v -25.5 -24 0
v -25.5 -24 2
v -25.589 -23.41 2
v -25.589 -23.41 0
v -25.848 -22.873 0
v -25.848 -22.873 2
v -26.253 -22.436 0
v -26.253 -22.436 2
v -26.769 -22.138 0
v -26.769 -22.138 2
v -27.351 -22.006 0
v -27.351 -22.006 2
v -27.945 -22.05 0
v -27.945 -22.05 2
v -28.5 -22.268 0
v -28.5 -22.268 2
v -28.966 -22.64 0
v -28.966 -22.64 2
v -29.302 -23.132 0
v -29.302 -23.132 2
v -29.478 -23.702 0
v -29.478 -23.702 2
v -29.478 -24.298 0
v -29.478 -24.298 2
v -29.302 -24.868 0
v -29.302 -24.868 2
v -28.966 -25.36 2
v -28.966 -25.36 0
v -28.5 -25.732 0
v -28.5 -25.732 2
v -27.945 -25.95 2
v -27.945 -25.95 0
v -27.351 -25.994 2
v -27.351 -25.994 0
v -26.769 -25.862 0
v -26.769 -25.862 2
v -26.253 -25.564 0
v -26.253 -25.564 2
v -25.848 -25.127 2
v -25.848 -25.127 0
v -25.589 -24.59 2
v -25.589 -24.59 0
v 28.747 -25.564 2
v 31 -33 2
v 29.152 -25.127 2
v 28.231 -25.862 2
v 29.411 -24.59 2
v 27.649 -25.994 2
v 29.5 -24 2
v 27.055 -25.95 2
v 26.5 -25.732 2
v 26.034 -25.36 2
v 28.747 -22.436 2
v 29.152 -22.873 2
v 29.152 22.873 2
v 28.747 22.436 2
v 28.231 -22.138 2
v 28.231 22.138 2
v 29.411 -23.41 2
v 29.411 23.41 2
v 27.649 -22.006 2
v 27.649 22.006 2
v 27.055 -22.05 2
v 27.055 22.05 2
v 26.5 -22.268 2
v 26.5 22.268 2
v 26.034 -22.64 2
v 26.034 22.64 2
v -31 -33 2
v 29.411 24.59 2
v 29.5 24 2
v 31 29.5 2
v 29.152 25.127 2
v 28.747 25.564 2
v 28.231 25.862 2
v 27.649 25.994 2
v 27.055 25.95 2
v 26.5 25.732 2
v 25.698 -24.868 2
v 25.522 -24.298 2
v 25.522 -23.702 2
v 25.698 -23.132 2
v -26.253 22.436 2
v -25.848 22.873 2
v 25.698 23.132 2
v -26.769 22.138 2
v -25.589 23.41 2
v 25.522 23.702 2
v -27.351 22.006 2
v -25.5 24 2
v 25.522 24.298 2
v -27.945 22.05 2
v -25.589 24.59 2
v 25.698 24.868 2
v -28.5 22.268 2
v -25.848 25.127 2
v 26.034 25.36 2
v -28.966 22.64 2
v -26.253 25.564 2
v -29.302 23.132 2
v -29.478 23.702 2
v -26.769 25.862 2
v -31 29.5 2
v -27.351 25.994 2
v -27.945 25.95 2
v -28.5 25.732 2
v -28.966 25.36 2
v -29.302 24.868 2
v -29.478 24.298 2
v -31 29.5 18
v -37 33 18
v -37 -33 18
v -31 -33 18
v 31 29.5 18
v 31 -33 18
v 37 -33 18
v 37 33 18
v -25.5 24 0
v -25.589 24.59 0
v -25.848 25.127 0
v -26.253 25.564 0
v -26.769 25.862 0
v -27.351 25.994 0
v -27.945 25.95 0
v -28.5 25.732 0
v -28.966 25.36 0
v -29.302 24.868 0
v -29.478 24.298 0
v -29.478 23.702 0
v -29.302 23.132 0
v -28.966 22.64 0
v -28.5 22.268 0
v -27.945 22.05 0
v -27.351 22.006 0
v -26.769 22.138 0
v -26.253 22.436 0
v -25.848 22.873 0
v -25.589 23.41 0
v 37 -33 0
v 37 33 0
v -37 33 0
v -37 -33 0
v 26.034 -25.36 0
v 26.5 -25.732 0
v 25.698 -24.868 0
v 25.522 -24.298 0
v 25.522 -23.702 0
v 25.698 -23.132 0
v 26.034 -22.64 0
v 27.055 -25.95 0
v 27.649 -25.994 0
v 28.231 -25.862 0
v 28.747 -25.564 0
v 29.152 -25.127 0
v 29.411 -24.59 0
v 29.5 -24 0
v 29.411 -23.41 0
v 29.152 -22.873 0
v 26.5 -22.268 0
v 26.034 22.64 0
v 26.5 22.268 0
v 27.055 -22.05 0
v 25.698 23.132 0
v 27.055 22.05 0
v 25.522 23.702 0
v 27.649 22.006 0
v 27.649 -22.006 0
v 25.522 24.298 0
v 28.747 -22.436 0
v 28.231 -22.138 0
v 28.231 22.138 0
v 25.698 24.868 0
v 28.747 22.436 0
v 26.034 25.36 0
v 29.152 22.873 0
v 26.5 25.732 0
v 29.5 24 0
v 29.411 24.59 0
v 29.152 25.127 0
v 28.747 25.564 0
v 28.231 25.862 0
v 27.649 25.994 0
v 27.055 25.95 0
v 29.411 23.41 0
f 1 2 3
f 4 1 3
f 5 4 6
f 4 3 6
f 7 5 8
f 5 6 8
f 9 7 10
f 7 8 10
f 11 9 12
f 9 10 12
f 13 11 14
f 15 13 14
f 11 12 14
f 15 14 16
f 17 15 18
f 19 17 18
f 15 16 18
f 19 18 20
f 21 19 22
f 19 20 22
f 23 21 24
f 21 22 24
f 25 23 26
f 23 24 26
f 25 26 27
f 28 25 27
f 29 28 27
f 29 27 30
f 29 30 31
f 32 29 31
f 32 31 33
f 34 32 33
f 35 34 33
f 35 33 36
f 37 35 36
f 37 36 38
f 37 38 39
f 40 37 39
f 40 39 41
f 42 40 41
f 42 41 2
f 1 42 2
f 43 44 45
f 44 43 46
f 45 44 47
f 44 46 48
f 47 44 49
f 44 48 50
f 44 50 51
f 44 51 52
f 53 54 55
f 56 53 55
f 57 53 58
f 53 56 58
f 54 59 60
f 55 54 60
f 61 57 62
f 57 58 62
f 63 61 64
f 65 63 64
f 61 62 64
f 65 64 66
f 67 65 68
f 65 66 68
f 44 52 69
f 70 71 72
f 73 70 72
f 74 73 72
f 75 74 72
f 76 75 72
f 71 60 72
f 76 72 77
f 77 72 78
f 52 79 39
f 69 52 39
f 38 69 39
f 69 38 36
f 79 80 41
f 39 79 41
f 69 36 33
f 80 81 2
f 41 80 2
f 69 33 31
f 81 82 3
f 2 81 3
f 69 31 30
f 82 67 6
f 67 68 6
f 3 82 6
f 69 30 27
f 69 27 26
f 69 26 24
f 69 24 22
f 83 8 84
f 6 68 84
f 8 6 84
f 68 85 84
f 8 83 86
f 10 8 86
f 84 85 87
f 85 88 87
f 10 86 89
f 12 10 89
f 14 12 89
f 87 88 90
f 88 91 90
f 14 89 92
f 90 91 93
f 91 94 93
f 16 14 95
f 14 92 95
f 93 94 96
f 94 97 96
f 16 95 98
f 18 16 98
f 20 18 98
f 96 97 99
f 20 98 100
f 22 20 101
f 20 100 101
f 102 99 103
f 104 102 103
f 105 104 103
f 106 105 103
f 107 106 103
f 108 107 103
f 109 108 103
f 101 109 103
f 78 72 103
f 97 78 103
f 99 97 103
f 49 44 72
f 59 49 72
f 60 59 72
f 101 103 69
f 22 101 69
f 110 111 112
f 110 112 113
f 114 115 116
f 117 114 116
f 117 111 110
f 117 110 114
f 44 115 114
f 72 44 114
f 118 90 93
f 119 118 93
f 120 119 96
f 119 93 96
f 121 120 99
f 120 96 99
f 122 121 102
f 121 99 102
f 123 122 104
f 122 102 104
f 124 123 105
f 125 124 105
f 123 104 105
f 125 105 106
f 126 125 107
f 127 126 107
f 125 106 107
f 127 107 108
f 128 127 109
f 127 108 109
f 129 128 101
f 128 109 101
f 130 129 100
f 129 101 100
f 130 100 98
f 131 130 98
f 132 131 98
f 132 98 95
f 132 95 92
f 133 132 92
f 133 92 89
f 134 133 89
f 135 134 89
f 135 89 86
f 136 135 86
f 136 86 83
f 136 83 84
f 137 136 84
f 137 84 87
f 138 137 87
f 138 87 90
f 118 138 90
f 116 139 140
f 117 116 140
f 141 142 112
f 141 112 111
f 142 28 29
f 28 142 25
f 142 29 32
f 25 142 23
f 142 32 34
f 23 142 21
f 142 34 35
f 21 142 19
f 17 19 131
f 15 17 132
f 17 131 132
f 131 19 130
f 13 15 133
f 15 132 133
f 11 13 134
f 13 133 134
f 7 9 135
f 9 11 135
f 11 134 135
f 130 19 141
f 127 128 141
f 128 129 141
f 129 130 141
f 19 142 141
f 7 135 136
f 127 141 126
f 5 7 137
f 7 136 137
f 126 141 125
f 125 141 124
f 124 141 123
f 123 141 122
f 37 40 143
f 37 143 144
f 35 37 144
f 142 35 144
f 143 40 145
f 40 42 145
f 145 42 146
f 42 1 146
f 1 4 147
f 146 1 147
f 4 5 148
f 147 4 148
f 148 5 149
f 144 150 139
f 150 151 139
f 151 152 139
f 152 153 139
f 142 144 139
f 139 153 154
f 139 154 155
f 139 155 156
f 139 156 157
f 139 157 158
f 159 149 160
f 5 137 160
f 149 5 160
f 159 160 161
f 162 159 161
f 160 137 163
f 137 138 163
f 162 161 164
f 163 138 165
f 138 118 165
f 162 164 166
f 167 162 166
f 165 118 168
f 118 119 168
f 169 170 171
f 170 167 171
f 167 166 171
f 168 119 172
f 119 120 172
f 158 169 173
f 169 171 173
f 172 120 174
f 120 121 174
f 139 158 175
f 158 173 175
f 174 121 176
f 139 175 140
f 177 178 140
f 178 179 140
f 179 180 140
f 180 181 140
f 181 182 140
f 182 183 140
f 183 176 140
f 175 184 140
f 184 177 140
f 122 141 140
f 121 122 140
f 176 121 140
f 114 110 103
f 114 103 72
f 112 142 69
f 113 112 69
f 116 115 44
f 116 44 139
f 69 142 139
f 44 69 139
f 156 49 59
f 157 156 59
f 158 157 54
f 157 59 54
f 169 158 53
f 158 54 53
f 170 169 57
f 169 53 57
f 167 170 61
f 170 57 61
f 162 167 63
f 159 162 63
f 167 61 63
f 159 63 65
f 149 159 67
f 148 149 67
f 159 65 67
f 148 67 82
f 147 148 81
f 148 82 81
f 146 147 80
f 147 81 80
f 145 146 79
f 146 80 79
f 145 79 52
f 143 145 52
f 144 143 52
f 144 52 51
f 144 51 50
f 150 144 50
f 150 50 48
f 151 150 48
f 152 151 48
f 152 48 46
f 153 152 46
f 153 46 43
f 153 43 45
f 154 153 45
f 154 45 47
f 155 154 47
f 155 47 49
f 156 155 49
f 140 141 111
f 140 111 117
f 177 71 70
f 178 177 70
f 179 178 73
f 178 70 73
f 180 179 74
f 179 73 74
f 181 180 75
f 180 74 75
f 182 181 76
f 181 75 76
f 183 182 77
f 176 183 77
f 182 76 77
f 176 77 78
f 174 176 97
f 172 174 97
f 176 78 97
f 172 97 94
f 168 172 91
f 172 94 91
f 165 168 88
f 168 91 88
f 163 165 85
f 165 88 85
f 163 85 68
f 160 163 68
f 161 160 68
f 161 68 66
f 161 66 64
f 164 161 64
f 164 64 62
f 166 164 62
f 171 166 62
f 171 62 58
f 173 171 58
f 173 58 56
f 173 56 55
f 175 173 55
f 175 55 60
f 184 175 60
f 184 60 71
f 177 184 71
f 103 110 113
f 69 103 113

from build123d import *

# Parameters (mm, degrees)
SKETCH001_W     = 74
SKETCH001_H     = 66
PAD_DEPTH       = 18
POCKET_DEPTH    = 16
SKETCH002_R     = 2
POCKET001_DEPTH = 2.001


with BuildPart() as part:
    # Sketch001 → Pad (new body)
    with BuildSketch(Plane.XY):
        Rectangle(SKETCH001_W, SKETCH001_H)
    extrude(amount=PAD_DEPTH)

    # Sketch (on Face6 of Pad) → Pocket (cut)
    with BuildSketch(Plane.XY.offset(18)):
        Polygon((-31, 29.5), (31, 29.5), (31, -29.5), (31, -33), (-31, -33), (-31, -29.5), align=None)
    extrude(amount=-POCKET_DEPTH, mode=Mode.SUBTRACT)

    # Sketch002 (on Face12 of Pocket) → Pocket001 (cut, through all)
    with BuildSketch(Plane.XY.offset(2)):
        with Locations((-27.5, 24)):
            Circle(SKETCH002_R)
        with Locations((27.5, 24)):
            Circle(SKETCH002_R)
        with Locations((27.5, -24)):
            Circle(SKETCH002_R)
        with Locations((-27.5, -24)):
            Circle(SKETCH002_R)
    extrude(amount=-POCKET001_DEPTH, mode=Mode.SUBTRACT)


solid = part.part
